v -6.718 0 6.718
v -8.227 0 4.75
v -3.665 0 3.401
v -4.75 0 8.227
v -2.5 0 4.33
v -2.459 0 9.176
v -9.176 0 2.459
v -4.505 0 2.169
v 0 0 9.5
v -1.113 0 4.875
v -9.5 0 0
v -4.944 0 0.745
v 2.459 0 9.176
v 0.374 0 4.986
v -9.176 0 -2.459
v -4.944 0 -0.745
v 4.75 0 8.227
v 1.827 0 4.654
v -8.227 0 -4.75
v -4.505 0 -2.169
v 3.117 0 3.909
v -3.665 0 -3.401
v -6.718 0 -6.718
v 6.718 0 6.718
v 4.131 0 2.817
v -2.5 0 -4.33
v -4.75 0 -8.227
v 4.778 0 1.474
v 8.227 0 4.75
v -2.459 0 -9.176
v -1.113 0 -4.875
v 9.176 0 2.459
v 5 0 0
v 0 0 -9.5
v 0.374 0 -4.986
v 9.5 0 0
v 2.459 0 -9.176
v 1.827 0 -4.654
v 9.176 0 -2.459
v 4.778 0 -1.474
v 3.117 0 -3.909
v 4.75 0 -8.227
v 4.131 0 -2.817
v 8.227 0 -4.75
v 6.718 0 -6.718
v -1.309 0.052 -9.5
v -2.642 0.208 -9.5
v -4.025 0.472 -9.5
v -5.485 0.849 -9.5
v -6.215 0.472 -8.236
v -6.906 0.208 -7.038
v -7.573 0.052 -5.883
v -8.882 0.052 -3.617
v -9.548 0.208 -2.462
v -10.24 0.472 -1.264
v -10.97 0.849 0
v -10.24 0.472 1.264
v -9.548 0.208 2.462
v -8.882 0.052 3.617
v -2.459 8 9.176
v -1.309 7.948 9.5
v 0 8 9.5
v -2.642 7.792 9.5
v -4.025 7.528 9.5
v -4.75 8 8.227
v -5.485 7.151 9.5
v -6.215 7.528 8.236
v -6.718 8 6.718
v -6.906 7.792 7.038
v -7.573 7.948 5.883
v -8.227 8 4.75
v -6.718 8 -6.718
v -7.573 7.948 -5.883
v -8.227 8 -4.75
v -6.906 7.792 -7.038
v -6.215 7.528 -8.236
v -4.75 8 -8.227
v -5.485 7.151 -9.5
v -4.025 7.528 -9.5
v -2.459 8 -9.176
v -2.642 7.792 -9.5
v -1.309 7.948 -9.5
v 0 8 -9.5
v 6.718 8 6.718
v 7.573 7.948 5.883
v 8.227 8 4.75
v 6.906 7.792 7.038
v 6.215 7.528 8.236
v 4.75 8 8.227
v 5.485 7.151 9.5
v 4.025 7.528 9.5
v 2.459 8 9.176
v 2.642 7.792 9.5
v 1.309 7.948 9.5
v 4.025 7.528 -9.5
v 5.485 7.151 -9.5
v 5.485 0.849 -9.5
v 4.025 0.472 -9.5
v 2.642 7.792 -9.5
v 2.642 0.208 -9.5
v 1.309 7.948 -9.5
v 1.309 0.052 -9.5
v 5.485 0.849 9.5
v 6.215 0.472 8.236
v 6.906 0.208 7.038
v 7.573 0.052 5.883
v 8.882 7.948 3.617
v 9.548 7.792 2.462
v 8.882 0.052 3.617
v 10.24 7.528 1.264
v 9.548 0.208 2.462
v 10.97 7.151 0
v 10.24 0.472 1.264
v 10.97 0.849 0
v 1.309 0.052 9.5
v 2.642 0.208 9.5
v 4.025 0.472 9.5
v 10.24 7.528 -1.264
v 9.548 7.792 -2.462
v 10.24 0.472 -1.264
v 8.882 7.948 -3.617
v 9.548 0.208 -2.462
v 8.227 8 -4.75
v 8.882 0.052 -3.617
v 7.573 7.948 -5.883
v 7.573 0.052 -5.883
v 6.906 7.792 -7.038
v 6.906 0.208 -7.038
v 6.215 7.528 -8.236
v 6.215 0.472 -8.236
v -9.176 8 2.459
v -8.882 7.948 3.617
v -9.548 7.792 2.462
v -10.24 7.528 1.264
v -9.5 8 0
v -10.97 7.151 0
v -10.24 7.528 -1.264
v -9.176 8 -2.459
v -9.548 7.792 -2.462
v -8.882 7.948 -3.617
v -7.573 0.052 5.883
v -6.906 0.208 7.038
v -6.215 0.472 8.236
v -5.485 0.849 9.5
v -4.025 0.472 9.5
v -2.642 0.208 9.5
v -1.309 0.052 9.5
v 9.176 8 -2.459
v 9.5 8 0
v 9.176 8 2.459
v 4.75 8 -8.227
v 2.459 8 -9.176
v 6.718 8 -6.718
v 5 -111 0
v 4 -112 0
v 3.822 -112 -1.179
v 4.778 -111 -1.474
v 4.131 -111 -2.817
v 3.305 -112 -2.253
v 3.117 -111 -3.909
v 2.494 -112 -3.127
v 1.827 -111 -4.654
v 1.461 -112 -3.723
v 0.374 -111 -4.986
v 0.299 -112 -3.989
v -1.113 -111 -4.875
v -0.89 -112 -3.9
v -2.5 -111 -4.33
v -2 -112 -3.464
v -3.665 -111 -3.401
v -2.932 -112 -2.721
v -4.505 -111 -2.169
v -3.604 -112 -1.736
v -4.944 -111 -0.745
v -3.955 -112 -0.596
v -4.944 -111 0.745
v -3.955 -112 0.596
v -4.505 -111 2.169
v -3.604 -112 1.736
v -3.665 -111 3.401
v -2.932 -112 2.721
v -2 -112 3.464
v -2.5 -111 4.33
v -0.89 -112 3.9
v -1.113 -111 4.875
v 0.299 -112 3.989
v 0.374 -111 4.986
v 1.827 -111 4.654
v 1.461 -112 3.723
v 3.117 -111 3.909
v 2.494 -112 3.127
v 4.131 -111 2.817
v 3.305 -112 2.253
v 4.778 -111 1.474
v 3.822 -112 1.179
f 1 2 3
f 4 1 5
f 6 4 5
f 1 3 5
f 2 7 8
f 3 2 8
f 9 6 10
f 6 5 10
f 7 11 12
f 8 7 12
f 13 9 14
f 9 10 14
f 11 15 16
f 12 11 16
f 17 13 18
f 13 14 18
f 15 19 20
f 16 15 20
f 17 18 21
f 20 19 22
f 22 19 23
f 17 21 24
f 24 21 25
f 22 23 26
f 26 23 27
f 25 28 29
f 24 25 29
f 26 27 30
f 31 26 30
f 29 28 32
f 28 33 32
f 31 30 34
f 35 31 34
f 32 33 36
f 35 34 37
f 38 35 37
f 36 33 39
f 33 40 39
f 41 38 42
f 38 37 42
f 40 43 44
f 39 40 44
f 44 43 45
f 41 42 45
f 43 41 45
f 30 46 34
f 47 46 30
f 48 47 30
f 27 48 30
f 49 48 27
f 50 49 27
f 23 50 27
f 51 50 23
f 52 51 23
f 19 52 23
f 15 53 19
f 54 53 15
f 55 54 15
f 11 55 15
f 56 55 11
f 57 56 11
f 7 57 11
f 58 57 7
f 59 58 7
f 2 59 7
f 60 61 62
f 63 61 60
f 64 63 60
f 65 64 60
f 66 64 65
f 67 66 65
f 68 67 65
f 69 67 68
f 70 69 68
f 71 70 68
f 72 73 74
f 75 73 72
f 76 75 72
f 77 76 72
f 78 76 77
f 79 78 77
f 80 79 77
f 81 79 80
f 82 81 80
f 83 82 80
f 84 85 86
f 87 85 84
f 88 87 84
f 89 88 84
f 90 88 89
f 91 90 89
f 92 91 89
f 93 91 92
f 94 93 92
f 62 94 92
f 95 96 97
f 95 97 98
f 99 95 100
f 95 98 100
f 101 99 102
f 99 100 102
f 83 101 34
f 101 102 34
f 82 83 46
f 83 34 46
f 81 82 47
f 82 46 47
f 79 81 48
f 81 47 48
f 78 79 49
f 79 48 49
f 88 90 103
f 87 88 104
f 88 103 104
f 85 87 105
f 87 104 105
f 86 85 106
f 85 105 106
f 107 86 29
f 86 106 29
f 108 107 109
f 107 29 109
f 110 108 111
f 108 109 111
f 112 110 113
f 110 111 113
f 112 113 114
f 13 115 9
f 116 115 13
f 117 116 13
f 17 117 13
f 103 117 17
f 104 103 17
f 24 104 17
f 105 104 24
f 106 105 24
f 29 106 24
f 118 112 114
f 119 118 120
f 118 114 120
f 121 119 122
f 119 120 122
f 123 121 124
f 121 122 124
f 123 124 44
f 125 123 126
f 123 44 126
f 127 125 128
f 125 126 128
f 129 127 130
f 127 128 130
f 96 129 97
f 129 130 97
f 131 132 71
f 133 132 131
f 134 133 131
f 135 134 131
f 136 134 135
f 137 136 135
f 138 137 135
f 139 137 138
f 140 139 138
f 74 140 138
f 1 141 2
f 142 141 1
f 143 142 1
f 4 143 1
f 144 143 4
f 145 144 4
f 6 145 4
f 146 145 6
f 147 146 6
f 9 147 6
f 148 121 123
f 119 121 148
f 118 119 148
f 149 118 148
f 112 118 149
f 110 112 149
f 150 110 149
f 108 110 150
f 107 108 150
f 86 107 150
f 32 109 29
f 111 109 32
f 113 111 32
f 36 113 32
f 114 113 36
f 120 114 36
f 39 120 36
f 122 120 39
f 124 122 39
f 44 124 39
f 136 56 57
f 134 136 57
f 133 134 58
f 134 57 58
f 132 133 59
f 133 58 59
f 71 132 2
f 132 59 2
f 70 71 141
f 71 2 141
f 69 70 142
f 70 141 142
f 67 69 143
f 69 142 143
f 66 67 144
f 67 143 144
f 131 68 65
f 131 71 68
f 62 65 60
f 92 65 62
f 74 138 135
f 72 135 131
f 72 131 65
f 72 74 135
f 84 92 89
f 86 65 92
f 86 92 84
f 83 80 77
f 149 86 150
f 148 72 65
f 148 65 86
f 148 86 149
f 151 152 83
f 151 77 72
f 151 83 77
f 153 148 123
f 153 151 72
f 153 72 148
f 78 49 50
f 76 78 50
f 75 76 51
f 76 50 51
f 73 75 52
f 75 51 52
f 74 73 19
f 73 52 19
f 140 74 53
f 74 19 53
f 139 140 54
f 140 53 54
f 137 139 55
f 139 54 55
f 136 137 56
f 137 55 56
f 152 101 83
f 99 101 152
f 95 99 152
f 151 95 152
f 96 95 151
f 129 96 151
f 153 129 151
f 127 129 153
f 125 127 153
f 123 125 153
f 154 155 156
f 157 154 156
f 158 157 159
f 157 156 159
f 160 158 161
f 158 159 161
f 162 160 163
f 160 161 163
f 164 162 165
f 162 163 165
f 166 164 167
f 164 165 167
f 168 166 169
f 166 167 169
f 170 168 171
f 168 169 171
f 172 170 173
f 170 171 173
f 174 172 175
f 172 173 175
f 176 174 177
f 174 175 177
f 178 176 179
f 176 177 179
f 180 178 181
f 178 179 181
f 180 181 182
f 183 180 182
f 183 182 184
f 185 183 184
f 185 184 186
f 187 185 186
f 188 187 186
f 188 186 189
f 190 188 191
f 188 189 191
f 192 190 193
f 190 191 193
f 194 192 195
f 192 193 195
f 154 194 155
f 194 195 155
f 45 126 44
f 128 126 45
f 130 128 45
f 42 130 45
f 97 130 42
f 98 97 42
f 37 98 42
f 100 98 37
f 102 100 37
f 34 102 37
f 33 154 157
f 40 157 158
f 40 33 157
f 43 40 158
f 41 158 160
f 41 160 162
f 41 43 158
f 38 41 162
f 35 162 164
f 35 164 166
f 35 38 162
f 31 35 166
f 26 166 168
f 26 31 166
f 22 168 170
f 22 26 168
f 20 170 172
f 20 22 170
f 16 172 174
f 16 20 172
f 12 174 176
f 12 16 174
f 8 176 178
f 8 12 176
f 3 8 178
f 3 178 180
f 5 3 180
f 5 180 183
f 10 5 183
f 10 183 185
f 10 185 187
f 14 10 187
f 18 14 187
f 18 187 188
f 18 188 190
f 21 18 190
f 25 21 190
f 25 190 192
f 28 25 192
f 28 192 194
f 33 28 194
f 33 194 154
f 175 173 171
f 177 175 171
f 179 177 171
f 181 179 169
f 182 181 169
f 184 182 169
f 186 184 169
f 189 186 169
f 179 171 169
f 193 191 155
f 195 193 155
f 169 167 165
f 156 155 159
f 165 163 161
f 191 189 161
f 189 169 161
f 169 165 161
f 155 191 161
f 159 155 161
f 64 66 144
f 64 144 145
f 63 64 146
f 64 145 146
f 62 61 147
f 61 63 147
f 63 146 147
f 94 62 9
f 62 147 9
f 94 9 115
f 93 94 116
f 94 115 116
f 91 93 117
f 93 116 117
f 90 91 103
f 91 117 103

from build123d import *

# Parameters (mm, degrees)
SALIENTE_EXTRUIR1_DEPTH = 8
CROQUIS2_R              = 4.25
CORTAR_EXTRUIR1_DEPTH   = 9
CROQUIS3_OUTSIDE_W      = 57.674
CROQUIS3_OUTSIDE_H      = 54.734
CROQUIS3_OUTSIDE_R      = 9.5
CORTAR_EXTRUIR2_DEPTH   = 8
CORTAR_EXTRUIR2_TAPER   = 60
CROQUIS4_OUTSIDE_W      = 57.674
CROQUIS4_OUTSIDE_H      = 54.734
CROQUIS4_OUTSIDE_R      = 9.5
CORTAR_EXTRUIR3_DEPTH   = 8
CORTAR_EXTRUIR3_TAPER   = 60
CROQUIS5_R              = 5
SALIENTE_EXTRUIR3_DEPTH = 120
CHAFL_N2_SIZE           = 1


with BuildPart() as part:
    # Croquis1 → Saliente-Extruir1 (new body)
    with BuildSketch(Plane(origin=(0, 0, 0), x_dir=(1, 0, 0), z_dir=(0, 1, 0))):
        Polygon((10.969655115, 0), (5.484827557, 9.5), (-5.484827557, 9.5), (-10.969655115, 0), (-5.484827557, -9.5), (5.484827557, -9.5), align=None)
    extrude(amount=SALIENTE_EXTRUIR1_DEPTH)

    # Croquis2 → Cortar-Extruir1 (cut, through all)
    with BuildSketch(Plane(origin=(0, 8, 0), x_dir=(1, 0, 0), z_dir=(0, 1, 0))):
        Circle(CROQUIS2_R)
    extrude(amount=-CORTAR_EXTRUIR1_DEPTH, mode=Mode.SUBTRACT)

    # Croquis3 outside → Cortar-Extruir2 (cut)
    with BuildSketch(Plane(origin=(0, 8, 0), x_dir=(1, 0, 0), z_dir=(0, 1, 0))):
        Rectangle(CROQUIS3_OUTSIDE_W, CROQUIS3_OUTSIDE_H)
        Circle(CROQUIS3_OUTSIDE_R, mode=Mode.SUBTRACT)
    extrude(amount=-CORTAR_EXTRUIR2_DEPTH, taper=CORTAR_EXTRUIR2_TAPER, mode=Mode.SUBTRACT)

    # Croquis4 outside → Cortar-Extruir3 (cut)
    with BuildSketch(Plane.XZ):
        Rectangle(CROQUIS4_OUTSIDE_W, CROQUIS4_OUTSIDE_H)
        Circle(CROQUIS4_OUTSIDE_R, mode=Mode.SUBTRACT)
    extrude(amount=-CORTAR_EXTRUIR3_DEPTH, taper=CORTAR_EXTRUIR3_TAPER, mode=Mode.SUBTRACT)

    # Croquis5 → Saliente-Extruir3 (add)
    with BuildSketch(Plane(origin=(0, 8, 0), x_dir=(1, 0, 0), z_dir=(0, 1, 0))):
        Circle(CROQUIS5_R)
    extrude(amount=-SALIENTE_EXTRUIR3_DEPTH)

    # Chaflán2
    chafl_n2_edges = [part.edges().sort_by_distance(p)[0] for p in [
        (-5, -112, 0),
    ]]
    chamfer(chafl_n2_edges, length=CHAFL_N2_SIZE)


solid = part.part
